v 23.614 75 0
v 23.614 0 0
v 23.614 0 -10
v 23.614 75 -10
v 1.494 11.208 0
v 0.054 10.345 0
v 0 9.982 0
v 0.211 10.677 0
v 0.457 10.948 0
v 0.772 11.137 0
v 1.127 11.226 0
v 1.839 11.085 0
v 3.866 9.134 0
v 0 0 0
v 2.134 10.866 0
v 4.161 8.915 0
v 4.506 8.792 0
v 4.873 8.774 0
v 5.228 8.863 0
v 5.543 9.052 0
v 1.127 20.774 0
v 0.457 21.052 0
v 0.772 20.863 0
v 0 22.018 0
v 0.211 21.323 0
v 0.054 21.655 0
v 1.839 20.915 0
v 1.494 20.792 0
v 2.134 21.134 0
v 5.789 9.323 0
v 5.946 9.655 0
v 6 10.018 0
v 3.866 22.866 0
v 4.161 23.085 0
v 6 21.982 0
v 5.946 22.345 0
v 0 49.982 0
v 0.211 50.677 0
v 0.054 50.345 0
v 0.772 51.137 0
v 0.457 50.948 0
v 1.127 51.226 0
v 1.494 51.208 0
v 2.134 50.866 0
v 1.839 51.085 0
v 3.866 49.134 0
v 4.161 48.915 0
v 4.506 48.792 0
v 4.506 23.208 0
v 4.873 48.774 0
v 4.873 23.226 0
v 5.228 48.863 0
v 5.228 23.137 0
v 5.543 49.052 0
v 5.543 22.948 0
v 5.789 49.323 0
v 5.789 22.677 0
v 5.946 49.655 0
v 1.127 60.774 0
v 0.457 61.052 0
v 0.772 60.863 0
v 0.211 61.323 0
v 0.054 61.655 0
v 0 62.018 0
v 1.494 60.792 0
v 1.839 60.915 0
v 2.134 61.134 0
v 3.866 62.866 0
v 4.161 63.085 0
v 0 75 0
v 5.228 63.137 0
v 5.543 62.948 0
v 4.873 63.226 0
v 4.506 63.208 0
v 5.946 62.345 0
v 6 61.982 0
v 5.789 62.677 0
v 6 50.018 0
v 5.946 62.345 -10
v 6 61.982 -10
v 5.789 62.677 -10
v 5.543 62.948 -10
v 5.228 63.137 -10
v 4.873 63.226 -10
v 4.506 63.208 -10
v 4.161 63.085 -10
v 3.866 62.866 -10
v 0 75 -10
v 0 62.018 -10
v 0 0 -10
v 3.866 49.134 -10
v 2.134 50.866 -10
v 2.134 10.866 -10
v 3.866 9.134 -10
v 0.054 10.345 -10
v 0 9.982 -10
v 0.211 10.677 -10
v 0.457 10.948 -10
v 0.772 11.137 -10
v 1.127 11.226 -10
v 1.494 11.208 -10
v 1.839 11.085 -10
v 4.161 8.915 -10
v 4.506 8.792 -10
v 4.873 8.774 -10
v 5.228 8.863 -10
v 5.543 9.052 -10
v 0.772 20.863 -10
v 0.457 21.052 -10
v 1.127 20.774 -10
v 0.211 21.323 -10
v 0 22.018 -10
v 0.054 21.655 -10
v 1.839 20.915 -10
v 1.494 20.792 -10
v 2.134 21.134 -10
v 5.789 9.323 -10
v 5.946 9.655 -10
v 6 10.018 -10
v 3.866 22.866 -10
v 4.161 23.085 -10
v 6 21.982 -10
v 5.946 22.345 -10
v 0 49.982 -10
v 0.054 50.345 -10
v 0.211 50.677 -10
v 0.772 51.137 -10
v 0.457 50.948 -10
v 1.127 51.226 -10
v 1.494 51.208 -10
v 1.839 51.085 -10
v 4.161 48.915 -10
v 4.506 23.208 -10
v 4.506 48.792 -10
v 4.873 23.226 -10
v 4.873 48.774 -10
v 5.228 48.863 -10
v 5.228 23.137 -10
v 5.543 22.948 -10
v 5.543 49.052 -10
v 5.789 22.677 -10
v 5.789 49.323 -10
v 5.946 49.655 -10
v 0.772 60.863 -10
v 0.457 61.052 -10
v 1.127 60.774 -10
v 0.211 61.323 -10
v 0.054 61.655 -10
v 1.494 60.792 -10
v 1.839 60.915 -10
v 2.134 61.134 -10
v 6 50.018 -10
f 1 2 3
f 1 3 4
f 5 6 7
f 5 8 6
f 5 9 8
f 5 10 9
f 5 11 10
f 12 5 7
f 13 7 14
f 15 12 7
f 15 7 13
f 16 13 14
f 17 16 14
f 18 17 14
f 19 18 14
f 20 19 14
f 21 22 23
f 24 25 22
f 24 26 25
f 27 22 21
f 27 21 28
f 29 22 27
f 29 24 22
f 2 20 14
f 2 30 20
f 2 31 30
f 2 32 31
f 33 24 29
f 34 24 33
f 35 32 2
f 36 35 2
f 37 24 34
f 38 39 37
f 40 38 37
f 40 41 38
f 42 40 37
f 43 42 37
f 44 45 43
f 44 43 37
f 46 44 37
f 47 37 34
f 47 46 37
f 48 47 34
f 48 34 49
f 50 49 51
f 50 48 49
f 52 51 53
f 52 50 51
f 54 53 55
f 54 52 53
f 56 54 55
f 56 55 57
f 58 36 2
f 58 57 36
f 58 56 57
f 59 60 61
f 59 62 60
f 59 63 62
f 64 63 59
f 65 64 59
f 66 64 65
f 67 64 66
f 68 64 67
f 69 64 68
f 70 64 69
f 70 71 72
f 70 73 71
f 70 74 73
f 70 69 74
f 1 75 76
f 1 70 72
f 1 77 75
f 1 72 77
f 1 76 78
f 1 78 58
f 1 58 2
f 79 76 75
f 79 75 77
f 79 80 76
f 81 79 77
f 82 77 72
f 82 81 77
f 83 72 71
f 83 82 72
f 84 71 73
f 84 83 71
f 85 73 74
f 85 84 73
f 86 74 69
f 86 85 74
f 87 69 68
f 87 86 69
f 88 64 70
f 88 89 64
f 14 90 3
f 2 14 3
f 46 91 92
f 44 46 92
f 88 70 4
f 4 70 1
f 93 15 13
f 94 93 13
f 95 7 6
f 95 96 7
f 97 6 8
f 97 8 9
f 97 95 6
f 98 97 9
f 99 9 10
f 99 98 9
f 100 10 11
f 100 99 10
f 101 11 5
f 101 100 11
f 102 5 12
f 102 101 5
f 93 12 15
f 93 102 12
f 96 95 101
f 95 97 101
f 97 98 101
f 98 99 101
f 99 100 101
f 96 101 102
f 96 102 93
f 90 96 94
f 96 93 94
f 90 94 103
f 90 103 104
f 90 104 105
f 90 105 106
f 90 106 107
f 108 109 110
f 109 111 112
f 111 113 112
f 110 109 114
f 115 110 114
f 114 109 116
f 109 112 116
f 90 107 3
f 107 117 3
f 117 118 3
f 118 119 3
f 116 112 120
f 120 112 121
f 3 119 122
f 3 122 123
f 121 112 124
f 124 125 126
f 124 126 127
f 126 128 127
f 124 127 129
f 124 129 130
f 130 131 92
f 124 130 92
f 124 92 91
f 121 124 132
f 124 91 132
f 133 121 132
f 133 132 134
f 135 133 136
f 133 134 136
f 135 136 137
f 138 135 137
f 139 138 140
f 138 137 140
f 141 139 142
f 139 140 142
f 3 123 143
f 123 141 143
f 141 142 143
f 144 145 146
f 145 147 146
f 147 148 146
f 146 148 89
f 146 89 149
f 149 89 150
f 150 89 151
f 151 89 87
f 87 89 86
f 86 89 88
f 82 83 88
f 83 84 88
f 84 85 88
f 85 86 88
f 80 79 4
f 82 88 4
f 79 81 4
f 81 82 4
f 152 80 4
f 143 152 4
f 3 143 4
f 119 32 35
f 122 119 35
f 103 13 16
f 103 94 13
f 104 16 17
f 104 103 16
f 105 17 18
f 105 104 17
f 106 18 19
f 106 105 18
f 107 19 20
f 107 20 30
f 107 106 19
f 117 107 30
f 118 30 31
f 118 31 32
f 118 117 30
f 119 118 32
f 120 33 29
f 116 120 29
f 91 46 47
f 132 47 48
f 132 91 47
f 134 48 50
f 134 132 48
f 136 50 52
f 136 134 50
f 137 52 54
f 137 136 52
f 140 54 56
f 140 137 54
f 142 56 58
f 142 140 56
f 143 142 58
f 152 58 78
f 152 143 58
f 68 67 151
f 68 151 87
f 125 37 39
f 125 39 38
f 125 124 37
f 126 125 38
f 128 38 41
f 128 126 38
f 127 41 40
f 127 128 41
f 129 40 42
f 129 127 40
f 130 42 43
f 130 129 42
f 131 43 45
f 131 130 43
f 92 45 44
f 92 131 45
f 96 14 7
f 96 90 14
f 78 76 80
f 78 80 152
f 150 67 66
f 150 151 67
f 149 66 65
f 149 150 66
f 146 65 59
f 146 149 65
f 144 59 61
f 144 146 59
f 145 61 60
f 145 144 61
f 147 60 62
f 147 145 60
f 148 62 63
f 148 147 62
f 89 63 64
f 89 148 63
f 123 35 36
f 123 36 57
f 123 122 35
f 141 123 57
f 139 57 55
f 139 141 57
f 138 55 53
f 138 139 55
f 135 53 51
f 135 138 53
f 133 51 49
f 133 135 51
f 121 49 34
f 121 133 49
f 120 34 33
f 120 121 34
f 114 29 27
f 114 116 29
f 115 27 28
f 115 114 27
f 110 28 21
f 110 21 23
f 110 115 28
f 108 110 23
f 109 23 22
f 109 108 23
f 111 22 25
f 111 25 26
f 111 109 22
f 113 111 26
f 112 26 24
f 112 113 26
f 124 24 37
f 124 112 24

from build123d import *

# Parameters (mm, degrees)
BOSS_EXTRUDE1_DEPTH = 10
BOSS_EXTRUDE2_DEPTH = 6.5
SKETCH4_R           = 3
SKETCH4_R_2         = 3.0000000000000084
CUT_EXTRUDE2_DEPTH  = 10
BOSS_EXTRUDE3_DEPTH = 60
BOSS_EXTRUDE5_DEPTH = 4
CUT_EXTRUDE3_DEPTH  = 186.5693940282179
FILLET2_R           = 3
CUT_EXTRUDE4_DEPTH  = 187.81541692269406
FILLET3_R           = 1.25
SKETCH9_OUTSIDE_W   = 170.05200000000002
SKETCH9_OUTSIDE_H   = 160.05200000000002
SKETCH9_OUTSIDE_W_2 = 23.614386219061117
SKETCH9_OUTSIDE_H_2 = 74.99999999999999
CUT_EXTRUDE6_DEPTH  = 10
CUT_EXTRUDE7_DEPTH  = 60


with BuildPart() as part:
    # Sketch2 → Boss-Extrude1 (new body)
    with BuildSketch(Plane.XY):
        Polygon((0, 0), (130, 0), (130, 14), (75, 69), (75, 120.00000000000001), (-2.45e-15, 120), align=None)
    extrude(amount=-BOSS_EXTRUDE1_DEPTH)

    # Sketch3 → Boss-Extrude2 (add)
    with BuildSketch(Plane.XY):
        Polygon((-2.45e-15, 120), (75, 120), (75, 116.99999999999999), (-2.08e-15, 117), align=None)
        Polygon((-2.45e-15, 80.99999999999999), (75, 80.99999999999999), (75, 77.99999999999999), (-2.08e-15, 77.99999999999999), align=None)
    extrude(amount=BOSS_EXTRUDE2_DEPTH)

    # Sketch4 → Cut-Extrude2 (cut)
    with BuildSketch(Plane.XY):
        with Locations((10.000000000000002, 98.99999999999999)):
            Circle(SKETCH4_R)
        with Locations((65, 98.99999999999997)):
            Circle(SKETCH4_R_2)
    extrude(amount=-CUT_EXTRUDE2_DEPTH, mode=Mode.SUBTRACT)

    # Sketch5 → Boss-Extrude3 (add)
    with BuildSketch(Plane.XY):
        Polygon((130, 14), (104.00000000000001, 13.999999999999995), (104.00000000000001, 4.78e-15), (130, 0), align=None)
        Polygon((7.999999999999998, 0), (34, 0), (34, 13.999999999999995), (7.999999999999993, 14), align=None)
    extrude(amount=BOSS_EXTRUDE3_DEPTH)

    # Sketch7 → Boss-Extrude5 (add)
    with BuildSketch(Plane.XY):
        with BuildLine():
            Line((52.99999999999999, 13.00000000000001), (53, 60.00000000000001))
            ThreePointArc((53, 60.00000000000001), (60, 67), (67, 60.00000000000001))
            Line((67, 60.00000000000001), (67, 13.00000000000001))
            ThreePointArc((67, 13.00000000000001), (60, 6.0000000000000036), (52.99999999999999, 13.00000000000001))
        make_face()
    extrude(amount=BOSS_EXTRUDE5_DEPTH)

    # Sketch8 → Cut-Extrude3 (cut, through all)
    with BuildSketch(Plane.XY.offset(4)):
        with BuildLine():
            Line((62.2, 13.00000000000001), (62.2, 60.00000000000001))
            ThreePointArc((62.2, 60.00000000000001), (60, 62.20000000000001), (57.8, 60.00000000000001))
            Line((57.8, 60.00000000000001), (57.79999999999999, 13.00000000000001))
            ThreePointArc((57.79999999999999, 13.00000000000001), (60, 10.8), (62.2, 13.00000000000001))
        make_face()
    extrude(amount=-CUT_EXTRUDE3_DEPTH, mode=Mode.SUBTRACT)

    # Fillet2
    fillet2_edges = [part.edges().sort_by_distance(p)[0] for p in [
        (75, 120, -1.75),
        (-2.45e-15, 120, -1.75),
        (37.5, 77.99999999999999, 0),
        (75, 69, -5),
    ]]
    fillet(fillet2_edges, radius=FILLET2_R)

    # Sketch6 → Cut-Extrude4 (cut, through all)
    with BuildSketch(Plane.XY):
        Polygon((-2.08e-15, 13.000000000000002), (5.999999999999998, 6.999999999999992), (5.999999999999998, 24.999999999999993), (-2.82e-15, 19), align=None)
        Polygon((5.999999999999998, 47), (-4.68e-15, 52.99999999999999), (-4.68e-15, 59), (5.999999999999998, 65), align=None)
    extrude(amount=-CUT_EXTRUDE4_DEPTH, mode=Mode.SUBTRACT)

    # Fillet3
    fillet3_edges = [part.edges().sort_by_distance(p)[0] for p in [
        (-2.08e-15, 13.000000000000002, -5),
        (-2.82e-15, 19, -5),
        (5.999999999999998, 24.999999999999993, -5),
        (5.999999999999998, 6.999999999999992, -5),
        (5.999999999999998, 65, -5),
        (5.999999999999998, 47, -5),
        (-4.68e-15, 52.99999999999999, -5),
        (-4.68e-15, 59, -5),
    ]]
    fillet(fillet3_edges, radius=FILLET3_R)

    # Sketch9 outside → Cut-Extrude6 (cut)
    with BuildSketch(Plane.XY):
        with Locations((65, 60.00000000000001)):
            Rectangle(SKETCH9_OUTSIDE_W, SKETCH9_OUTSIDE_H)
        with Locations((11.807193109530559, 37.49999999999999)):
            Rectangle(SKETCH9_OUTSIDE_W_2, SKETCH9_OUTSIDE_H_2, mode=Mode.SUBTRACT)
    extrude(amount=-CUT_EXTRUDE6_DEPTH, mode=Mode.SUBTRACT)


with BuildPart() as body_2:
    # of the pieces the cut leaves, the one that is kept (cut_extrude6_keep)
    add(part.part.solids().sort_by_distance((0, 62.017766953, 0))[0])

    # Sketch10 → Cut-Extrude7 (cut)
    with BuildSketch(Plane.XY.offset(60)):
        Polygon((7.999999999999993, 14), (7.999999999999998, 0), (34, 0), (34, 13.999999999999995), align=None)
    extrude(amount=-CUT_EXTRUDE7_DEPTH, mode=Mode.SUBTRACT)


solid = body_2.part
